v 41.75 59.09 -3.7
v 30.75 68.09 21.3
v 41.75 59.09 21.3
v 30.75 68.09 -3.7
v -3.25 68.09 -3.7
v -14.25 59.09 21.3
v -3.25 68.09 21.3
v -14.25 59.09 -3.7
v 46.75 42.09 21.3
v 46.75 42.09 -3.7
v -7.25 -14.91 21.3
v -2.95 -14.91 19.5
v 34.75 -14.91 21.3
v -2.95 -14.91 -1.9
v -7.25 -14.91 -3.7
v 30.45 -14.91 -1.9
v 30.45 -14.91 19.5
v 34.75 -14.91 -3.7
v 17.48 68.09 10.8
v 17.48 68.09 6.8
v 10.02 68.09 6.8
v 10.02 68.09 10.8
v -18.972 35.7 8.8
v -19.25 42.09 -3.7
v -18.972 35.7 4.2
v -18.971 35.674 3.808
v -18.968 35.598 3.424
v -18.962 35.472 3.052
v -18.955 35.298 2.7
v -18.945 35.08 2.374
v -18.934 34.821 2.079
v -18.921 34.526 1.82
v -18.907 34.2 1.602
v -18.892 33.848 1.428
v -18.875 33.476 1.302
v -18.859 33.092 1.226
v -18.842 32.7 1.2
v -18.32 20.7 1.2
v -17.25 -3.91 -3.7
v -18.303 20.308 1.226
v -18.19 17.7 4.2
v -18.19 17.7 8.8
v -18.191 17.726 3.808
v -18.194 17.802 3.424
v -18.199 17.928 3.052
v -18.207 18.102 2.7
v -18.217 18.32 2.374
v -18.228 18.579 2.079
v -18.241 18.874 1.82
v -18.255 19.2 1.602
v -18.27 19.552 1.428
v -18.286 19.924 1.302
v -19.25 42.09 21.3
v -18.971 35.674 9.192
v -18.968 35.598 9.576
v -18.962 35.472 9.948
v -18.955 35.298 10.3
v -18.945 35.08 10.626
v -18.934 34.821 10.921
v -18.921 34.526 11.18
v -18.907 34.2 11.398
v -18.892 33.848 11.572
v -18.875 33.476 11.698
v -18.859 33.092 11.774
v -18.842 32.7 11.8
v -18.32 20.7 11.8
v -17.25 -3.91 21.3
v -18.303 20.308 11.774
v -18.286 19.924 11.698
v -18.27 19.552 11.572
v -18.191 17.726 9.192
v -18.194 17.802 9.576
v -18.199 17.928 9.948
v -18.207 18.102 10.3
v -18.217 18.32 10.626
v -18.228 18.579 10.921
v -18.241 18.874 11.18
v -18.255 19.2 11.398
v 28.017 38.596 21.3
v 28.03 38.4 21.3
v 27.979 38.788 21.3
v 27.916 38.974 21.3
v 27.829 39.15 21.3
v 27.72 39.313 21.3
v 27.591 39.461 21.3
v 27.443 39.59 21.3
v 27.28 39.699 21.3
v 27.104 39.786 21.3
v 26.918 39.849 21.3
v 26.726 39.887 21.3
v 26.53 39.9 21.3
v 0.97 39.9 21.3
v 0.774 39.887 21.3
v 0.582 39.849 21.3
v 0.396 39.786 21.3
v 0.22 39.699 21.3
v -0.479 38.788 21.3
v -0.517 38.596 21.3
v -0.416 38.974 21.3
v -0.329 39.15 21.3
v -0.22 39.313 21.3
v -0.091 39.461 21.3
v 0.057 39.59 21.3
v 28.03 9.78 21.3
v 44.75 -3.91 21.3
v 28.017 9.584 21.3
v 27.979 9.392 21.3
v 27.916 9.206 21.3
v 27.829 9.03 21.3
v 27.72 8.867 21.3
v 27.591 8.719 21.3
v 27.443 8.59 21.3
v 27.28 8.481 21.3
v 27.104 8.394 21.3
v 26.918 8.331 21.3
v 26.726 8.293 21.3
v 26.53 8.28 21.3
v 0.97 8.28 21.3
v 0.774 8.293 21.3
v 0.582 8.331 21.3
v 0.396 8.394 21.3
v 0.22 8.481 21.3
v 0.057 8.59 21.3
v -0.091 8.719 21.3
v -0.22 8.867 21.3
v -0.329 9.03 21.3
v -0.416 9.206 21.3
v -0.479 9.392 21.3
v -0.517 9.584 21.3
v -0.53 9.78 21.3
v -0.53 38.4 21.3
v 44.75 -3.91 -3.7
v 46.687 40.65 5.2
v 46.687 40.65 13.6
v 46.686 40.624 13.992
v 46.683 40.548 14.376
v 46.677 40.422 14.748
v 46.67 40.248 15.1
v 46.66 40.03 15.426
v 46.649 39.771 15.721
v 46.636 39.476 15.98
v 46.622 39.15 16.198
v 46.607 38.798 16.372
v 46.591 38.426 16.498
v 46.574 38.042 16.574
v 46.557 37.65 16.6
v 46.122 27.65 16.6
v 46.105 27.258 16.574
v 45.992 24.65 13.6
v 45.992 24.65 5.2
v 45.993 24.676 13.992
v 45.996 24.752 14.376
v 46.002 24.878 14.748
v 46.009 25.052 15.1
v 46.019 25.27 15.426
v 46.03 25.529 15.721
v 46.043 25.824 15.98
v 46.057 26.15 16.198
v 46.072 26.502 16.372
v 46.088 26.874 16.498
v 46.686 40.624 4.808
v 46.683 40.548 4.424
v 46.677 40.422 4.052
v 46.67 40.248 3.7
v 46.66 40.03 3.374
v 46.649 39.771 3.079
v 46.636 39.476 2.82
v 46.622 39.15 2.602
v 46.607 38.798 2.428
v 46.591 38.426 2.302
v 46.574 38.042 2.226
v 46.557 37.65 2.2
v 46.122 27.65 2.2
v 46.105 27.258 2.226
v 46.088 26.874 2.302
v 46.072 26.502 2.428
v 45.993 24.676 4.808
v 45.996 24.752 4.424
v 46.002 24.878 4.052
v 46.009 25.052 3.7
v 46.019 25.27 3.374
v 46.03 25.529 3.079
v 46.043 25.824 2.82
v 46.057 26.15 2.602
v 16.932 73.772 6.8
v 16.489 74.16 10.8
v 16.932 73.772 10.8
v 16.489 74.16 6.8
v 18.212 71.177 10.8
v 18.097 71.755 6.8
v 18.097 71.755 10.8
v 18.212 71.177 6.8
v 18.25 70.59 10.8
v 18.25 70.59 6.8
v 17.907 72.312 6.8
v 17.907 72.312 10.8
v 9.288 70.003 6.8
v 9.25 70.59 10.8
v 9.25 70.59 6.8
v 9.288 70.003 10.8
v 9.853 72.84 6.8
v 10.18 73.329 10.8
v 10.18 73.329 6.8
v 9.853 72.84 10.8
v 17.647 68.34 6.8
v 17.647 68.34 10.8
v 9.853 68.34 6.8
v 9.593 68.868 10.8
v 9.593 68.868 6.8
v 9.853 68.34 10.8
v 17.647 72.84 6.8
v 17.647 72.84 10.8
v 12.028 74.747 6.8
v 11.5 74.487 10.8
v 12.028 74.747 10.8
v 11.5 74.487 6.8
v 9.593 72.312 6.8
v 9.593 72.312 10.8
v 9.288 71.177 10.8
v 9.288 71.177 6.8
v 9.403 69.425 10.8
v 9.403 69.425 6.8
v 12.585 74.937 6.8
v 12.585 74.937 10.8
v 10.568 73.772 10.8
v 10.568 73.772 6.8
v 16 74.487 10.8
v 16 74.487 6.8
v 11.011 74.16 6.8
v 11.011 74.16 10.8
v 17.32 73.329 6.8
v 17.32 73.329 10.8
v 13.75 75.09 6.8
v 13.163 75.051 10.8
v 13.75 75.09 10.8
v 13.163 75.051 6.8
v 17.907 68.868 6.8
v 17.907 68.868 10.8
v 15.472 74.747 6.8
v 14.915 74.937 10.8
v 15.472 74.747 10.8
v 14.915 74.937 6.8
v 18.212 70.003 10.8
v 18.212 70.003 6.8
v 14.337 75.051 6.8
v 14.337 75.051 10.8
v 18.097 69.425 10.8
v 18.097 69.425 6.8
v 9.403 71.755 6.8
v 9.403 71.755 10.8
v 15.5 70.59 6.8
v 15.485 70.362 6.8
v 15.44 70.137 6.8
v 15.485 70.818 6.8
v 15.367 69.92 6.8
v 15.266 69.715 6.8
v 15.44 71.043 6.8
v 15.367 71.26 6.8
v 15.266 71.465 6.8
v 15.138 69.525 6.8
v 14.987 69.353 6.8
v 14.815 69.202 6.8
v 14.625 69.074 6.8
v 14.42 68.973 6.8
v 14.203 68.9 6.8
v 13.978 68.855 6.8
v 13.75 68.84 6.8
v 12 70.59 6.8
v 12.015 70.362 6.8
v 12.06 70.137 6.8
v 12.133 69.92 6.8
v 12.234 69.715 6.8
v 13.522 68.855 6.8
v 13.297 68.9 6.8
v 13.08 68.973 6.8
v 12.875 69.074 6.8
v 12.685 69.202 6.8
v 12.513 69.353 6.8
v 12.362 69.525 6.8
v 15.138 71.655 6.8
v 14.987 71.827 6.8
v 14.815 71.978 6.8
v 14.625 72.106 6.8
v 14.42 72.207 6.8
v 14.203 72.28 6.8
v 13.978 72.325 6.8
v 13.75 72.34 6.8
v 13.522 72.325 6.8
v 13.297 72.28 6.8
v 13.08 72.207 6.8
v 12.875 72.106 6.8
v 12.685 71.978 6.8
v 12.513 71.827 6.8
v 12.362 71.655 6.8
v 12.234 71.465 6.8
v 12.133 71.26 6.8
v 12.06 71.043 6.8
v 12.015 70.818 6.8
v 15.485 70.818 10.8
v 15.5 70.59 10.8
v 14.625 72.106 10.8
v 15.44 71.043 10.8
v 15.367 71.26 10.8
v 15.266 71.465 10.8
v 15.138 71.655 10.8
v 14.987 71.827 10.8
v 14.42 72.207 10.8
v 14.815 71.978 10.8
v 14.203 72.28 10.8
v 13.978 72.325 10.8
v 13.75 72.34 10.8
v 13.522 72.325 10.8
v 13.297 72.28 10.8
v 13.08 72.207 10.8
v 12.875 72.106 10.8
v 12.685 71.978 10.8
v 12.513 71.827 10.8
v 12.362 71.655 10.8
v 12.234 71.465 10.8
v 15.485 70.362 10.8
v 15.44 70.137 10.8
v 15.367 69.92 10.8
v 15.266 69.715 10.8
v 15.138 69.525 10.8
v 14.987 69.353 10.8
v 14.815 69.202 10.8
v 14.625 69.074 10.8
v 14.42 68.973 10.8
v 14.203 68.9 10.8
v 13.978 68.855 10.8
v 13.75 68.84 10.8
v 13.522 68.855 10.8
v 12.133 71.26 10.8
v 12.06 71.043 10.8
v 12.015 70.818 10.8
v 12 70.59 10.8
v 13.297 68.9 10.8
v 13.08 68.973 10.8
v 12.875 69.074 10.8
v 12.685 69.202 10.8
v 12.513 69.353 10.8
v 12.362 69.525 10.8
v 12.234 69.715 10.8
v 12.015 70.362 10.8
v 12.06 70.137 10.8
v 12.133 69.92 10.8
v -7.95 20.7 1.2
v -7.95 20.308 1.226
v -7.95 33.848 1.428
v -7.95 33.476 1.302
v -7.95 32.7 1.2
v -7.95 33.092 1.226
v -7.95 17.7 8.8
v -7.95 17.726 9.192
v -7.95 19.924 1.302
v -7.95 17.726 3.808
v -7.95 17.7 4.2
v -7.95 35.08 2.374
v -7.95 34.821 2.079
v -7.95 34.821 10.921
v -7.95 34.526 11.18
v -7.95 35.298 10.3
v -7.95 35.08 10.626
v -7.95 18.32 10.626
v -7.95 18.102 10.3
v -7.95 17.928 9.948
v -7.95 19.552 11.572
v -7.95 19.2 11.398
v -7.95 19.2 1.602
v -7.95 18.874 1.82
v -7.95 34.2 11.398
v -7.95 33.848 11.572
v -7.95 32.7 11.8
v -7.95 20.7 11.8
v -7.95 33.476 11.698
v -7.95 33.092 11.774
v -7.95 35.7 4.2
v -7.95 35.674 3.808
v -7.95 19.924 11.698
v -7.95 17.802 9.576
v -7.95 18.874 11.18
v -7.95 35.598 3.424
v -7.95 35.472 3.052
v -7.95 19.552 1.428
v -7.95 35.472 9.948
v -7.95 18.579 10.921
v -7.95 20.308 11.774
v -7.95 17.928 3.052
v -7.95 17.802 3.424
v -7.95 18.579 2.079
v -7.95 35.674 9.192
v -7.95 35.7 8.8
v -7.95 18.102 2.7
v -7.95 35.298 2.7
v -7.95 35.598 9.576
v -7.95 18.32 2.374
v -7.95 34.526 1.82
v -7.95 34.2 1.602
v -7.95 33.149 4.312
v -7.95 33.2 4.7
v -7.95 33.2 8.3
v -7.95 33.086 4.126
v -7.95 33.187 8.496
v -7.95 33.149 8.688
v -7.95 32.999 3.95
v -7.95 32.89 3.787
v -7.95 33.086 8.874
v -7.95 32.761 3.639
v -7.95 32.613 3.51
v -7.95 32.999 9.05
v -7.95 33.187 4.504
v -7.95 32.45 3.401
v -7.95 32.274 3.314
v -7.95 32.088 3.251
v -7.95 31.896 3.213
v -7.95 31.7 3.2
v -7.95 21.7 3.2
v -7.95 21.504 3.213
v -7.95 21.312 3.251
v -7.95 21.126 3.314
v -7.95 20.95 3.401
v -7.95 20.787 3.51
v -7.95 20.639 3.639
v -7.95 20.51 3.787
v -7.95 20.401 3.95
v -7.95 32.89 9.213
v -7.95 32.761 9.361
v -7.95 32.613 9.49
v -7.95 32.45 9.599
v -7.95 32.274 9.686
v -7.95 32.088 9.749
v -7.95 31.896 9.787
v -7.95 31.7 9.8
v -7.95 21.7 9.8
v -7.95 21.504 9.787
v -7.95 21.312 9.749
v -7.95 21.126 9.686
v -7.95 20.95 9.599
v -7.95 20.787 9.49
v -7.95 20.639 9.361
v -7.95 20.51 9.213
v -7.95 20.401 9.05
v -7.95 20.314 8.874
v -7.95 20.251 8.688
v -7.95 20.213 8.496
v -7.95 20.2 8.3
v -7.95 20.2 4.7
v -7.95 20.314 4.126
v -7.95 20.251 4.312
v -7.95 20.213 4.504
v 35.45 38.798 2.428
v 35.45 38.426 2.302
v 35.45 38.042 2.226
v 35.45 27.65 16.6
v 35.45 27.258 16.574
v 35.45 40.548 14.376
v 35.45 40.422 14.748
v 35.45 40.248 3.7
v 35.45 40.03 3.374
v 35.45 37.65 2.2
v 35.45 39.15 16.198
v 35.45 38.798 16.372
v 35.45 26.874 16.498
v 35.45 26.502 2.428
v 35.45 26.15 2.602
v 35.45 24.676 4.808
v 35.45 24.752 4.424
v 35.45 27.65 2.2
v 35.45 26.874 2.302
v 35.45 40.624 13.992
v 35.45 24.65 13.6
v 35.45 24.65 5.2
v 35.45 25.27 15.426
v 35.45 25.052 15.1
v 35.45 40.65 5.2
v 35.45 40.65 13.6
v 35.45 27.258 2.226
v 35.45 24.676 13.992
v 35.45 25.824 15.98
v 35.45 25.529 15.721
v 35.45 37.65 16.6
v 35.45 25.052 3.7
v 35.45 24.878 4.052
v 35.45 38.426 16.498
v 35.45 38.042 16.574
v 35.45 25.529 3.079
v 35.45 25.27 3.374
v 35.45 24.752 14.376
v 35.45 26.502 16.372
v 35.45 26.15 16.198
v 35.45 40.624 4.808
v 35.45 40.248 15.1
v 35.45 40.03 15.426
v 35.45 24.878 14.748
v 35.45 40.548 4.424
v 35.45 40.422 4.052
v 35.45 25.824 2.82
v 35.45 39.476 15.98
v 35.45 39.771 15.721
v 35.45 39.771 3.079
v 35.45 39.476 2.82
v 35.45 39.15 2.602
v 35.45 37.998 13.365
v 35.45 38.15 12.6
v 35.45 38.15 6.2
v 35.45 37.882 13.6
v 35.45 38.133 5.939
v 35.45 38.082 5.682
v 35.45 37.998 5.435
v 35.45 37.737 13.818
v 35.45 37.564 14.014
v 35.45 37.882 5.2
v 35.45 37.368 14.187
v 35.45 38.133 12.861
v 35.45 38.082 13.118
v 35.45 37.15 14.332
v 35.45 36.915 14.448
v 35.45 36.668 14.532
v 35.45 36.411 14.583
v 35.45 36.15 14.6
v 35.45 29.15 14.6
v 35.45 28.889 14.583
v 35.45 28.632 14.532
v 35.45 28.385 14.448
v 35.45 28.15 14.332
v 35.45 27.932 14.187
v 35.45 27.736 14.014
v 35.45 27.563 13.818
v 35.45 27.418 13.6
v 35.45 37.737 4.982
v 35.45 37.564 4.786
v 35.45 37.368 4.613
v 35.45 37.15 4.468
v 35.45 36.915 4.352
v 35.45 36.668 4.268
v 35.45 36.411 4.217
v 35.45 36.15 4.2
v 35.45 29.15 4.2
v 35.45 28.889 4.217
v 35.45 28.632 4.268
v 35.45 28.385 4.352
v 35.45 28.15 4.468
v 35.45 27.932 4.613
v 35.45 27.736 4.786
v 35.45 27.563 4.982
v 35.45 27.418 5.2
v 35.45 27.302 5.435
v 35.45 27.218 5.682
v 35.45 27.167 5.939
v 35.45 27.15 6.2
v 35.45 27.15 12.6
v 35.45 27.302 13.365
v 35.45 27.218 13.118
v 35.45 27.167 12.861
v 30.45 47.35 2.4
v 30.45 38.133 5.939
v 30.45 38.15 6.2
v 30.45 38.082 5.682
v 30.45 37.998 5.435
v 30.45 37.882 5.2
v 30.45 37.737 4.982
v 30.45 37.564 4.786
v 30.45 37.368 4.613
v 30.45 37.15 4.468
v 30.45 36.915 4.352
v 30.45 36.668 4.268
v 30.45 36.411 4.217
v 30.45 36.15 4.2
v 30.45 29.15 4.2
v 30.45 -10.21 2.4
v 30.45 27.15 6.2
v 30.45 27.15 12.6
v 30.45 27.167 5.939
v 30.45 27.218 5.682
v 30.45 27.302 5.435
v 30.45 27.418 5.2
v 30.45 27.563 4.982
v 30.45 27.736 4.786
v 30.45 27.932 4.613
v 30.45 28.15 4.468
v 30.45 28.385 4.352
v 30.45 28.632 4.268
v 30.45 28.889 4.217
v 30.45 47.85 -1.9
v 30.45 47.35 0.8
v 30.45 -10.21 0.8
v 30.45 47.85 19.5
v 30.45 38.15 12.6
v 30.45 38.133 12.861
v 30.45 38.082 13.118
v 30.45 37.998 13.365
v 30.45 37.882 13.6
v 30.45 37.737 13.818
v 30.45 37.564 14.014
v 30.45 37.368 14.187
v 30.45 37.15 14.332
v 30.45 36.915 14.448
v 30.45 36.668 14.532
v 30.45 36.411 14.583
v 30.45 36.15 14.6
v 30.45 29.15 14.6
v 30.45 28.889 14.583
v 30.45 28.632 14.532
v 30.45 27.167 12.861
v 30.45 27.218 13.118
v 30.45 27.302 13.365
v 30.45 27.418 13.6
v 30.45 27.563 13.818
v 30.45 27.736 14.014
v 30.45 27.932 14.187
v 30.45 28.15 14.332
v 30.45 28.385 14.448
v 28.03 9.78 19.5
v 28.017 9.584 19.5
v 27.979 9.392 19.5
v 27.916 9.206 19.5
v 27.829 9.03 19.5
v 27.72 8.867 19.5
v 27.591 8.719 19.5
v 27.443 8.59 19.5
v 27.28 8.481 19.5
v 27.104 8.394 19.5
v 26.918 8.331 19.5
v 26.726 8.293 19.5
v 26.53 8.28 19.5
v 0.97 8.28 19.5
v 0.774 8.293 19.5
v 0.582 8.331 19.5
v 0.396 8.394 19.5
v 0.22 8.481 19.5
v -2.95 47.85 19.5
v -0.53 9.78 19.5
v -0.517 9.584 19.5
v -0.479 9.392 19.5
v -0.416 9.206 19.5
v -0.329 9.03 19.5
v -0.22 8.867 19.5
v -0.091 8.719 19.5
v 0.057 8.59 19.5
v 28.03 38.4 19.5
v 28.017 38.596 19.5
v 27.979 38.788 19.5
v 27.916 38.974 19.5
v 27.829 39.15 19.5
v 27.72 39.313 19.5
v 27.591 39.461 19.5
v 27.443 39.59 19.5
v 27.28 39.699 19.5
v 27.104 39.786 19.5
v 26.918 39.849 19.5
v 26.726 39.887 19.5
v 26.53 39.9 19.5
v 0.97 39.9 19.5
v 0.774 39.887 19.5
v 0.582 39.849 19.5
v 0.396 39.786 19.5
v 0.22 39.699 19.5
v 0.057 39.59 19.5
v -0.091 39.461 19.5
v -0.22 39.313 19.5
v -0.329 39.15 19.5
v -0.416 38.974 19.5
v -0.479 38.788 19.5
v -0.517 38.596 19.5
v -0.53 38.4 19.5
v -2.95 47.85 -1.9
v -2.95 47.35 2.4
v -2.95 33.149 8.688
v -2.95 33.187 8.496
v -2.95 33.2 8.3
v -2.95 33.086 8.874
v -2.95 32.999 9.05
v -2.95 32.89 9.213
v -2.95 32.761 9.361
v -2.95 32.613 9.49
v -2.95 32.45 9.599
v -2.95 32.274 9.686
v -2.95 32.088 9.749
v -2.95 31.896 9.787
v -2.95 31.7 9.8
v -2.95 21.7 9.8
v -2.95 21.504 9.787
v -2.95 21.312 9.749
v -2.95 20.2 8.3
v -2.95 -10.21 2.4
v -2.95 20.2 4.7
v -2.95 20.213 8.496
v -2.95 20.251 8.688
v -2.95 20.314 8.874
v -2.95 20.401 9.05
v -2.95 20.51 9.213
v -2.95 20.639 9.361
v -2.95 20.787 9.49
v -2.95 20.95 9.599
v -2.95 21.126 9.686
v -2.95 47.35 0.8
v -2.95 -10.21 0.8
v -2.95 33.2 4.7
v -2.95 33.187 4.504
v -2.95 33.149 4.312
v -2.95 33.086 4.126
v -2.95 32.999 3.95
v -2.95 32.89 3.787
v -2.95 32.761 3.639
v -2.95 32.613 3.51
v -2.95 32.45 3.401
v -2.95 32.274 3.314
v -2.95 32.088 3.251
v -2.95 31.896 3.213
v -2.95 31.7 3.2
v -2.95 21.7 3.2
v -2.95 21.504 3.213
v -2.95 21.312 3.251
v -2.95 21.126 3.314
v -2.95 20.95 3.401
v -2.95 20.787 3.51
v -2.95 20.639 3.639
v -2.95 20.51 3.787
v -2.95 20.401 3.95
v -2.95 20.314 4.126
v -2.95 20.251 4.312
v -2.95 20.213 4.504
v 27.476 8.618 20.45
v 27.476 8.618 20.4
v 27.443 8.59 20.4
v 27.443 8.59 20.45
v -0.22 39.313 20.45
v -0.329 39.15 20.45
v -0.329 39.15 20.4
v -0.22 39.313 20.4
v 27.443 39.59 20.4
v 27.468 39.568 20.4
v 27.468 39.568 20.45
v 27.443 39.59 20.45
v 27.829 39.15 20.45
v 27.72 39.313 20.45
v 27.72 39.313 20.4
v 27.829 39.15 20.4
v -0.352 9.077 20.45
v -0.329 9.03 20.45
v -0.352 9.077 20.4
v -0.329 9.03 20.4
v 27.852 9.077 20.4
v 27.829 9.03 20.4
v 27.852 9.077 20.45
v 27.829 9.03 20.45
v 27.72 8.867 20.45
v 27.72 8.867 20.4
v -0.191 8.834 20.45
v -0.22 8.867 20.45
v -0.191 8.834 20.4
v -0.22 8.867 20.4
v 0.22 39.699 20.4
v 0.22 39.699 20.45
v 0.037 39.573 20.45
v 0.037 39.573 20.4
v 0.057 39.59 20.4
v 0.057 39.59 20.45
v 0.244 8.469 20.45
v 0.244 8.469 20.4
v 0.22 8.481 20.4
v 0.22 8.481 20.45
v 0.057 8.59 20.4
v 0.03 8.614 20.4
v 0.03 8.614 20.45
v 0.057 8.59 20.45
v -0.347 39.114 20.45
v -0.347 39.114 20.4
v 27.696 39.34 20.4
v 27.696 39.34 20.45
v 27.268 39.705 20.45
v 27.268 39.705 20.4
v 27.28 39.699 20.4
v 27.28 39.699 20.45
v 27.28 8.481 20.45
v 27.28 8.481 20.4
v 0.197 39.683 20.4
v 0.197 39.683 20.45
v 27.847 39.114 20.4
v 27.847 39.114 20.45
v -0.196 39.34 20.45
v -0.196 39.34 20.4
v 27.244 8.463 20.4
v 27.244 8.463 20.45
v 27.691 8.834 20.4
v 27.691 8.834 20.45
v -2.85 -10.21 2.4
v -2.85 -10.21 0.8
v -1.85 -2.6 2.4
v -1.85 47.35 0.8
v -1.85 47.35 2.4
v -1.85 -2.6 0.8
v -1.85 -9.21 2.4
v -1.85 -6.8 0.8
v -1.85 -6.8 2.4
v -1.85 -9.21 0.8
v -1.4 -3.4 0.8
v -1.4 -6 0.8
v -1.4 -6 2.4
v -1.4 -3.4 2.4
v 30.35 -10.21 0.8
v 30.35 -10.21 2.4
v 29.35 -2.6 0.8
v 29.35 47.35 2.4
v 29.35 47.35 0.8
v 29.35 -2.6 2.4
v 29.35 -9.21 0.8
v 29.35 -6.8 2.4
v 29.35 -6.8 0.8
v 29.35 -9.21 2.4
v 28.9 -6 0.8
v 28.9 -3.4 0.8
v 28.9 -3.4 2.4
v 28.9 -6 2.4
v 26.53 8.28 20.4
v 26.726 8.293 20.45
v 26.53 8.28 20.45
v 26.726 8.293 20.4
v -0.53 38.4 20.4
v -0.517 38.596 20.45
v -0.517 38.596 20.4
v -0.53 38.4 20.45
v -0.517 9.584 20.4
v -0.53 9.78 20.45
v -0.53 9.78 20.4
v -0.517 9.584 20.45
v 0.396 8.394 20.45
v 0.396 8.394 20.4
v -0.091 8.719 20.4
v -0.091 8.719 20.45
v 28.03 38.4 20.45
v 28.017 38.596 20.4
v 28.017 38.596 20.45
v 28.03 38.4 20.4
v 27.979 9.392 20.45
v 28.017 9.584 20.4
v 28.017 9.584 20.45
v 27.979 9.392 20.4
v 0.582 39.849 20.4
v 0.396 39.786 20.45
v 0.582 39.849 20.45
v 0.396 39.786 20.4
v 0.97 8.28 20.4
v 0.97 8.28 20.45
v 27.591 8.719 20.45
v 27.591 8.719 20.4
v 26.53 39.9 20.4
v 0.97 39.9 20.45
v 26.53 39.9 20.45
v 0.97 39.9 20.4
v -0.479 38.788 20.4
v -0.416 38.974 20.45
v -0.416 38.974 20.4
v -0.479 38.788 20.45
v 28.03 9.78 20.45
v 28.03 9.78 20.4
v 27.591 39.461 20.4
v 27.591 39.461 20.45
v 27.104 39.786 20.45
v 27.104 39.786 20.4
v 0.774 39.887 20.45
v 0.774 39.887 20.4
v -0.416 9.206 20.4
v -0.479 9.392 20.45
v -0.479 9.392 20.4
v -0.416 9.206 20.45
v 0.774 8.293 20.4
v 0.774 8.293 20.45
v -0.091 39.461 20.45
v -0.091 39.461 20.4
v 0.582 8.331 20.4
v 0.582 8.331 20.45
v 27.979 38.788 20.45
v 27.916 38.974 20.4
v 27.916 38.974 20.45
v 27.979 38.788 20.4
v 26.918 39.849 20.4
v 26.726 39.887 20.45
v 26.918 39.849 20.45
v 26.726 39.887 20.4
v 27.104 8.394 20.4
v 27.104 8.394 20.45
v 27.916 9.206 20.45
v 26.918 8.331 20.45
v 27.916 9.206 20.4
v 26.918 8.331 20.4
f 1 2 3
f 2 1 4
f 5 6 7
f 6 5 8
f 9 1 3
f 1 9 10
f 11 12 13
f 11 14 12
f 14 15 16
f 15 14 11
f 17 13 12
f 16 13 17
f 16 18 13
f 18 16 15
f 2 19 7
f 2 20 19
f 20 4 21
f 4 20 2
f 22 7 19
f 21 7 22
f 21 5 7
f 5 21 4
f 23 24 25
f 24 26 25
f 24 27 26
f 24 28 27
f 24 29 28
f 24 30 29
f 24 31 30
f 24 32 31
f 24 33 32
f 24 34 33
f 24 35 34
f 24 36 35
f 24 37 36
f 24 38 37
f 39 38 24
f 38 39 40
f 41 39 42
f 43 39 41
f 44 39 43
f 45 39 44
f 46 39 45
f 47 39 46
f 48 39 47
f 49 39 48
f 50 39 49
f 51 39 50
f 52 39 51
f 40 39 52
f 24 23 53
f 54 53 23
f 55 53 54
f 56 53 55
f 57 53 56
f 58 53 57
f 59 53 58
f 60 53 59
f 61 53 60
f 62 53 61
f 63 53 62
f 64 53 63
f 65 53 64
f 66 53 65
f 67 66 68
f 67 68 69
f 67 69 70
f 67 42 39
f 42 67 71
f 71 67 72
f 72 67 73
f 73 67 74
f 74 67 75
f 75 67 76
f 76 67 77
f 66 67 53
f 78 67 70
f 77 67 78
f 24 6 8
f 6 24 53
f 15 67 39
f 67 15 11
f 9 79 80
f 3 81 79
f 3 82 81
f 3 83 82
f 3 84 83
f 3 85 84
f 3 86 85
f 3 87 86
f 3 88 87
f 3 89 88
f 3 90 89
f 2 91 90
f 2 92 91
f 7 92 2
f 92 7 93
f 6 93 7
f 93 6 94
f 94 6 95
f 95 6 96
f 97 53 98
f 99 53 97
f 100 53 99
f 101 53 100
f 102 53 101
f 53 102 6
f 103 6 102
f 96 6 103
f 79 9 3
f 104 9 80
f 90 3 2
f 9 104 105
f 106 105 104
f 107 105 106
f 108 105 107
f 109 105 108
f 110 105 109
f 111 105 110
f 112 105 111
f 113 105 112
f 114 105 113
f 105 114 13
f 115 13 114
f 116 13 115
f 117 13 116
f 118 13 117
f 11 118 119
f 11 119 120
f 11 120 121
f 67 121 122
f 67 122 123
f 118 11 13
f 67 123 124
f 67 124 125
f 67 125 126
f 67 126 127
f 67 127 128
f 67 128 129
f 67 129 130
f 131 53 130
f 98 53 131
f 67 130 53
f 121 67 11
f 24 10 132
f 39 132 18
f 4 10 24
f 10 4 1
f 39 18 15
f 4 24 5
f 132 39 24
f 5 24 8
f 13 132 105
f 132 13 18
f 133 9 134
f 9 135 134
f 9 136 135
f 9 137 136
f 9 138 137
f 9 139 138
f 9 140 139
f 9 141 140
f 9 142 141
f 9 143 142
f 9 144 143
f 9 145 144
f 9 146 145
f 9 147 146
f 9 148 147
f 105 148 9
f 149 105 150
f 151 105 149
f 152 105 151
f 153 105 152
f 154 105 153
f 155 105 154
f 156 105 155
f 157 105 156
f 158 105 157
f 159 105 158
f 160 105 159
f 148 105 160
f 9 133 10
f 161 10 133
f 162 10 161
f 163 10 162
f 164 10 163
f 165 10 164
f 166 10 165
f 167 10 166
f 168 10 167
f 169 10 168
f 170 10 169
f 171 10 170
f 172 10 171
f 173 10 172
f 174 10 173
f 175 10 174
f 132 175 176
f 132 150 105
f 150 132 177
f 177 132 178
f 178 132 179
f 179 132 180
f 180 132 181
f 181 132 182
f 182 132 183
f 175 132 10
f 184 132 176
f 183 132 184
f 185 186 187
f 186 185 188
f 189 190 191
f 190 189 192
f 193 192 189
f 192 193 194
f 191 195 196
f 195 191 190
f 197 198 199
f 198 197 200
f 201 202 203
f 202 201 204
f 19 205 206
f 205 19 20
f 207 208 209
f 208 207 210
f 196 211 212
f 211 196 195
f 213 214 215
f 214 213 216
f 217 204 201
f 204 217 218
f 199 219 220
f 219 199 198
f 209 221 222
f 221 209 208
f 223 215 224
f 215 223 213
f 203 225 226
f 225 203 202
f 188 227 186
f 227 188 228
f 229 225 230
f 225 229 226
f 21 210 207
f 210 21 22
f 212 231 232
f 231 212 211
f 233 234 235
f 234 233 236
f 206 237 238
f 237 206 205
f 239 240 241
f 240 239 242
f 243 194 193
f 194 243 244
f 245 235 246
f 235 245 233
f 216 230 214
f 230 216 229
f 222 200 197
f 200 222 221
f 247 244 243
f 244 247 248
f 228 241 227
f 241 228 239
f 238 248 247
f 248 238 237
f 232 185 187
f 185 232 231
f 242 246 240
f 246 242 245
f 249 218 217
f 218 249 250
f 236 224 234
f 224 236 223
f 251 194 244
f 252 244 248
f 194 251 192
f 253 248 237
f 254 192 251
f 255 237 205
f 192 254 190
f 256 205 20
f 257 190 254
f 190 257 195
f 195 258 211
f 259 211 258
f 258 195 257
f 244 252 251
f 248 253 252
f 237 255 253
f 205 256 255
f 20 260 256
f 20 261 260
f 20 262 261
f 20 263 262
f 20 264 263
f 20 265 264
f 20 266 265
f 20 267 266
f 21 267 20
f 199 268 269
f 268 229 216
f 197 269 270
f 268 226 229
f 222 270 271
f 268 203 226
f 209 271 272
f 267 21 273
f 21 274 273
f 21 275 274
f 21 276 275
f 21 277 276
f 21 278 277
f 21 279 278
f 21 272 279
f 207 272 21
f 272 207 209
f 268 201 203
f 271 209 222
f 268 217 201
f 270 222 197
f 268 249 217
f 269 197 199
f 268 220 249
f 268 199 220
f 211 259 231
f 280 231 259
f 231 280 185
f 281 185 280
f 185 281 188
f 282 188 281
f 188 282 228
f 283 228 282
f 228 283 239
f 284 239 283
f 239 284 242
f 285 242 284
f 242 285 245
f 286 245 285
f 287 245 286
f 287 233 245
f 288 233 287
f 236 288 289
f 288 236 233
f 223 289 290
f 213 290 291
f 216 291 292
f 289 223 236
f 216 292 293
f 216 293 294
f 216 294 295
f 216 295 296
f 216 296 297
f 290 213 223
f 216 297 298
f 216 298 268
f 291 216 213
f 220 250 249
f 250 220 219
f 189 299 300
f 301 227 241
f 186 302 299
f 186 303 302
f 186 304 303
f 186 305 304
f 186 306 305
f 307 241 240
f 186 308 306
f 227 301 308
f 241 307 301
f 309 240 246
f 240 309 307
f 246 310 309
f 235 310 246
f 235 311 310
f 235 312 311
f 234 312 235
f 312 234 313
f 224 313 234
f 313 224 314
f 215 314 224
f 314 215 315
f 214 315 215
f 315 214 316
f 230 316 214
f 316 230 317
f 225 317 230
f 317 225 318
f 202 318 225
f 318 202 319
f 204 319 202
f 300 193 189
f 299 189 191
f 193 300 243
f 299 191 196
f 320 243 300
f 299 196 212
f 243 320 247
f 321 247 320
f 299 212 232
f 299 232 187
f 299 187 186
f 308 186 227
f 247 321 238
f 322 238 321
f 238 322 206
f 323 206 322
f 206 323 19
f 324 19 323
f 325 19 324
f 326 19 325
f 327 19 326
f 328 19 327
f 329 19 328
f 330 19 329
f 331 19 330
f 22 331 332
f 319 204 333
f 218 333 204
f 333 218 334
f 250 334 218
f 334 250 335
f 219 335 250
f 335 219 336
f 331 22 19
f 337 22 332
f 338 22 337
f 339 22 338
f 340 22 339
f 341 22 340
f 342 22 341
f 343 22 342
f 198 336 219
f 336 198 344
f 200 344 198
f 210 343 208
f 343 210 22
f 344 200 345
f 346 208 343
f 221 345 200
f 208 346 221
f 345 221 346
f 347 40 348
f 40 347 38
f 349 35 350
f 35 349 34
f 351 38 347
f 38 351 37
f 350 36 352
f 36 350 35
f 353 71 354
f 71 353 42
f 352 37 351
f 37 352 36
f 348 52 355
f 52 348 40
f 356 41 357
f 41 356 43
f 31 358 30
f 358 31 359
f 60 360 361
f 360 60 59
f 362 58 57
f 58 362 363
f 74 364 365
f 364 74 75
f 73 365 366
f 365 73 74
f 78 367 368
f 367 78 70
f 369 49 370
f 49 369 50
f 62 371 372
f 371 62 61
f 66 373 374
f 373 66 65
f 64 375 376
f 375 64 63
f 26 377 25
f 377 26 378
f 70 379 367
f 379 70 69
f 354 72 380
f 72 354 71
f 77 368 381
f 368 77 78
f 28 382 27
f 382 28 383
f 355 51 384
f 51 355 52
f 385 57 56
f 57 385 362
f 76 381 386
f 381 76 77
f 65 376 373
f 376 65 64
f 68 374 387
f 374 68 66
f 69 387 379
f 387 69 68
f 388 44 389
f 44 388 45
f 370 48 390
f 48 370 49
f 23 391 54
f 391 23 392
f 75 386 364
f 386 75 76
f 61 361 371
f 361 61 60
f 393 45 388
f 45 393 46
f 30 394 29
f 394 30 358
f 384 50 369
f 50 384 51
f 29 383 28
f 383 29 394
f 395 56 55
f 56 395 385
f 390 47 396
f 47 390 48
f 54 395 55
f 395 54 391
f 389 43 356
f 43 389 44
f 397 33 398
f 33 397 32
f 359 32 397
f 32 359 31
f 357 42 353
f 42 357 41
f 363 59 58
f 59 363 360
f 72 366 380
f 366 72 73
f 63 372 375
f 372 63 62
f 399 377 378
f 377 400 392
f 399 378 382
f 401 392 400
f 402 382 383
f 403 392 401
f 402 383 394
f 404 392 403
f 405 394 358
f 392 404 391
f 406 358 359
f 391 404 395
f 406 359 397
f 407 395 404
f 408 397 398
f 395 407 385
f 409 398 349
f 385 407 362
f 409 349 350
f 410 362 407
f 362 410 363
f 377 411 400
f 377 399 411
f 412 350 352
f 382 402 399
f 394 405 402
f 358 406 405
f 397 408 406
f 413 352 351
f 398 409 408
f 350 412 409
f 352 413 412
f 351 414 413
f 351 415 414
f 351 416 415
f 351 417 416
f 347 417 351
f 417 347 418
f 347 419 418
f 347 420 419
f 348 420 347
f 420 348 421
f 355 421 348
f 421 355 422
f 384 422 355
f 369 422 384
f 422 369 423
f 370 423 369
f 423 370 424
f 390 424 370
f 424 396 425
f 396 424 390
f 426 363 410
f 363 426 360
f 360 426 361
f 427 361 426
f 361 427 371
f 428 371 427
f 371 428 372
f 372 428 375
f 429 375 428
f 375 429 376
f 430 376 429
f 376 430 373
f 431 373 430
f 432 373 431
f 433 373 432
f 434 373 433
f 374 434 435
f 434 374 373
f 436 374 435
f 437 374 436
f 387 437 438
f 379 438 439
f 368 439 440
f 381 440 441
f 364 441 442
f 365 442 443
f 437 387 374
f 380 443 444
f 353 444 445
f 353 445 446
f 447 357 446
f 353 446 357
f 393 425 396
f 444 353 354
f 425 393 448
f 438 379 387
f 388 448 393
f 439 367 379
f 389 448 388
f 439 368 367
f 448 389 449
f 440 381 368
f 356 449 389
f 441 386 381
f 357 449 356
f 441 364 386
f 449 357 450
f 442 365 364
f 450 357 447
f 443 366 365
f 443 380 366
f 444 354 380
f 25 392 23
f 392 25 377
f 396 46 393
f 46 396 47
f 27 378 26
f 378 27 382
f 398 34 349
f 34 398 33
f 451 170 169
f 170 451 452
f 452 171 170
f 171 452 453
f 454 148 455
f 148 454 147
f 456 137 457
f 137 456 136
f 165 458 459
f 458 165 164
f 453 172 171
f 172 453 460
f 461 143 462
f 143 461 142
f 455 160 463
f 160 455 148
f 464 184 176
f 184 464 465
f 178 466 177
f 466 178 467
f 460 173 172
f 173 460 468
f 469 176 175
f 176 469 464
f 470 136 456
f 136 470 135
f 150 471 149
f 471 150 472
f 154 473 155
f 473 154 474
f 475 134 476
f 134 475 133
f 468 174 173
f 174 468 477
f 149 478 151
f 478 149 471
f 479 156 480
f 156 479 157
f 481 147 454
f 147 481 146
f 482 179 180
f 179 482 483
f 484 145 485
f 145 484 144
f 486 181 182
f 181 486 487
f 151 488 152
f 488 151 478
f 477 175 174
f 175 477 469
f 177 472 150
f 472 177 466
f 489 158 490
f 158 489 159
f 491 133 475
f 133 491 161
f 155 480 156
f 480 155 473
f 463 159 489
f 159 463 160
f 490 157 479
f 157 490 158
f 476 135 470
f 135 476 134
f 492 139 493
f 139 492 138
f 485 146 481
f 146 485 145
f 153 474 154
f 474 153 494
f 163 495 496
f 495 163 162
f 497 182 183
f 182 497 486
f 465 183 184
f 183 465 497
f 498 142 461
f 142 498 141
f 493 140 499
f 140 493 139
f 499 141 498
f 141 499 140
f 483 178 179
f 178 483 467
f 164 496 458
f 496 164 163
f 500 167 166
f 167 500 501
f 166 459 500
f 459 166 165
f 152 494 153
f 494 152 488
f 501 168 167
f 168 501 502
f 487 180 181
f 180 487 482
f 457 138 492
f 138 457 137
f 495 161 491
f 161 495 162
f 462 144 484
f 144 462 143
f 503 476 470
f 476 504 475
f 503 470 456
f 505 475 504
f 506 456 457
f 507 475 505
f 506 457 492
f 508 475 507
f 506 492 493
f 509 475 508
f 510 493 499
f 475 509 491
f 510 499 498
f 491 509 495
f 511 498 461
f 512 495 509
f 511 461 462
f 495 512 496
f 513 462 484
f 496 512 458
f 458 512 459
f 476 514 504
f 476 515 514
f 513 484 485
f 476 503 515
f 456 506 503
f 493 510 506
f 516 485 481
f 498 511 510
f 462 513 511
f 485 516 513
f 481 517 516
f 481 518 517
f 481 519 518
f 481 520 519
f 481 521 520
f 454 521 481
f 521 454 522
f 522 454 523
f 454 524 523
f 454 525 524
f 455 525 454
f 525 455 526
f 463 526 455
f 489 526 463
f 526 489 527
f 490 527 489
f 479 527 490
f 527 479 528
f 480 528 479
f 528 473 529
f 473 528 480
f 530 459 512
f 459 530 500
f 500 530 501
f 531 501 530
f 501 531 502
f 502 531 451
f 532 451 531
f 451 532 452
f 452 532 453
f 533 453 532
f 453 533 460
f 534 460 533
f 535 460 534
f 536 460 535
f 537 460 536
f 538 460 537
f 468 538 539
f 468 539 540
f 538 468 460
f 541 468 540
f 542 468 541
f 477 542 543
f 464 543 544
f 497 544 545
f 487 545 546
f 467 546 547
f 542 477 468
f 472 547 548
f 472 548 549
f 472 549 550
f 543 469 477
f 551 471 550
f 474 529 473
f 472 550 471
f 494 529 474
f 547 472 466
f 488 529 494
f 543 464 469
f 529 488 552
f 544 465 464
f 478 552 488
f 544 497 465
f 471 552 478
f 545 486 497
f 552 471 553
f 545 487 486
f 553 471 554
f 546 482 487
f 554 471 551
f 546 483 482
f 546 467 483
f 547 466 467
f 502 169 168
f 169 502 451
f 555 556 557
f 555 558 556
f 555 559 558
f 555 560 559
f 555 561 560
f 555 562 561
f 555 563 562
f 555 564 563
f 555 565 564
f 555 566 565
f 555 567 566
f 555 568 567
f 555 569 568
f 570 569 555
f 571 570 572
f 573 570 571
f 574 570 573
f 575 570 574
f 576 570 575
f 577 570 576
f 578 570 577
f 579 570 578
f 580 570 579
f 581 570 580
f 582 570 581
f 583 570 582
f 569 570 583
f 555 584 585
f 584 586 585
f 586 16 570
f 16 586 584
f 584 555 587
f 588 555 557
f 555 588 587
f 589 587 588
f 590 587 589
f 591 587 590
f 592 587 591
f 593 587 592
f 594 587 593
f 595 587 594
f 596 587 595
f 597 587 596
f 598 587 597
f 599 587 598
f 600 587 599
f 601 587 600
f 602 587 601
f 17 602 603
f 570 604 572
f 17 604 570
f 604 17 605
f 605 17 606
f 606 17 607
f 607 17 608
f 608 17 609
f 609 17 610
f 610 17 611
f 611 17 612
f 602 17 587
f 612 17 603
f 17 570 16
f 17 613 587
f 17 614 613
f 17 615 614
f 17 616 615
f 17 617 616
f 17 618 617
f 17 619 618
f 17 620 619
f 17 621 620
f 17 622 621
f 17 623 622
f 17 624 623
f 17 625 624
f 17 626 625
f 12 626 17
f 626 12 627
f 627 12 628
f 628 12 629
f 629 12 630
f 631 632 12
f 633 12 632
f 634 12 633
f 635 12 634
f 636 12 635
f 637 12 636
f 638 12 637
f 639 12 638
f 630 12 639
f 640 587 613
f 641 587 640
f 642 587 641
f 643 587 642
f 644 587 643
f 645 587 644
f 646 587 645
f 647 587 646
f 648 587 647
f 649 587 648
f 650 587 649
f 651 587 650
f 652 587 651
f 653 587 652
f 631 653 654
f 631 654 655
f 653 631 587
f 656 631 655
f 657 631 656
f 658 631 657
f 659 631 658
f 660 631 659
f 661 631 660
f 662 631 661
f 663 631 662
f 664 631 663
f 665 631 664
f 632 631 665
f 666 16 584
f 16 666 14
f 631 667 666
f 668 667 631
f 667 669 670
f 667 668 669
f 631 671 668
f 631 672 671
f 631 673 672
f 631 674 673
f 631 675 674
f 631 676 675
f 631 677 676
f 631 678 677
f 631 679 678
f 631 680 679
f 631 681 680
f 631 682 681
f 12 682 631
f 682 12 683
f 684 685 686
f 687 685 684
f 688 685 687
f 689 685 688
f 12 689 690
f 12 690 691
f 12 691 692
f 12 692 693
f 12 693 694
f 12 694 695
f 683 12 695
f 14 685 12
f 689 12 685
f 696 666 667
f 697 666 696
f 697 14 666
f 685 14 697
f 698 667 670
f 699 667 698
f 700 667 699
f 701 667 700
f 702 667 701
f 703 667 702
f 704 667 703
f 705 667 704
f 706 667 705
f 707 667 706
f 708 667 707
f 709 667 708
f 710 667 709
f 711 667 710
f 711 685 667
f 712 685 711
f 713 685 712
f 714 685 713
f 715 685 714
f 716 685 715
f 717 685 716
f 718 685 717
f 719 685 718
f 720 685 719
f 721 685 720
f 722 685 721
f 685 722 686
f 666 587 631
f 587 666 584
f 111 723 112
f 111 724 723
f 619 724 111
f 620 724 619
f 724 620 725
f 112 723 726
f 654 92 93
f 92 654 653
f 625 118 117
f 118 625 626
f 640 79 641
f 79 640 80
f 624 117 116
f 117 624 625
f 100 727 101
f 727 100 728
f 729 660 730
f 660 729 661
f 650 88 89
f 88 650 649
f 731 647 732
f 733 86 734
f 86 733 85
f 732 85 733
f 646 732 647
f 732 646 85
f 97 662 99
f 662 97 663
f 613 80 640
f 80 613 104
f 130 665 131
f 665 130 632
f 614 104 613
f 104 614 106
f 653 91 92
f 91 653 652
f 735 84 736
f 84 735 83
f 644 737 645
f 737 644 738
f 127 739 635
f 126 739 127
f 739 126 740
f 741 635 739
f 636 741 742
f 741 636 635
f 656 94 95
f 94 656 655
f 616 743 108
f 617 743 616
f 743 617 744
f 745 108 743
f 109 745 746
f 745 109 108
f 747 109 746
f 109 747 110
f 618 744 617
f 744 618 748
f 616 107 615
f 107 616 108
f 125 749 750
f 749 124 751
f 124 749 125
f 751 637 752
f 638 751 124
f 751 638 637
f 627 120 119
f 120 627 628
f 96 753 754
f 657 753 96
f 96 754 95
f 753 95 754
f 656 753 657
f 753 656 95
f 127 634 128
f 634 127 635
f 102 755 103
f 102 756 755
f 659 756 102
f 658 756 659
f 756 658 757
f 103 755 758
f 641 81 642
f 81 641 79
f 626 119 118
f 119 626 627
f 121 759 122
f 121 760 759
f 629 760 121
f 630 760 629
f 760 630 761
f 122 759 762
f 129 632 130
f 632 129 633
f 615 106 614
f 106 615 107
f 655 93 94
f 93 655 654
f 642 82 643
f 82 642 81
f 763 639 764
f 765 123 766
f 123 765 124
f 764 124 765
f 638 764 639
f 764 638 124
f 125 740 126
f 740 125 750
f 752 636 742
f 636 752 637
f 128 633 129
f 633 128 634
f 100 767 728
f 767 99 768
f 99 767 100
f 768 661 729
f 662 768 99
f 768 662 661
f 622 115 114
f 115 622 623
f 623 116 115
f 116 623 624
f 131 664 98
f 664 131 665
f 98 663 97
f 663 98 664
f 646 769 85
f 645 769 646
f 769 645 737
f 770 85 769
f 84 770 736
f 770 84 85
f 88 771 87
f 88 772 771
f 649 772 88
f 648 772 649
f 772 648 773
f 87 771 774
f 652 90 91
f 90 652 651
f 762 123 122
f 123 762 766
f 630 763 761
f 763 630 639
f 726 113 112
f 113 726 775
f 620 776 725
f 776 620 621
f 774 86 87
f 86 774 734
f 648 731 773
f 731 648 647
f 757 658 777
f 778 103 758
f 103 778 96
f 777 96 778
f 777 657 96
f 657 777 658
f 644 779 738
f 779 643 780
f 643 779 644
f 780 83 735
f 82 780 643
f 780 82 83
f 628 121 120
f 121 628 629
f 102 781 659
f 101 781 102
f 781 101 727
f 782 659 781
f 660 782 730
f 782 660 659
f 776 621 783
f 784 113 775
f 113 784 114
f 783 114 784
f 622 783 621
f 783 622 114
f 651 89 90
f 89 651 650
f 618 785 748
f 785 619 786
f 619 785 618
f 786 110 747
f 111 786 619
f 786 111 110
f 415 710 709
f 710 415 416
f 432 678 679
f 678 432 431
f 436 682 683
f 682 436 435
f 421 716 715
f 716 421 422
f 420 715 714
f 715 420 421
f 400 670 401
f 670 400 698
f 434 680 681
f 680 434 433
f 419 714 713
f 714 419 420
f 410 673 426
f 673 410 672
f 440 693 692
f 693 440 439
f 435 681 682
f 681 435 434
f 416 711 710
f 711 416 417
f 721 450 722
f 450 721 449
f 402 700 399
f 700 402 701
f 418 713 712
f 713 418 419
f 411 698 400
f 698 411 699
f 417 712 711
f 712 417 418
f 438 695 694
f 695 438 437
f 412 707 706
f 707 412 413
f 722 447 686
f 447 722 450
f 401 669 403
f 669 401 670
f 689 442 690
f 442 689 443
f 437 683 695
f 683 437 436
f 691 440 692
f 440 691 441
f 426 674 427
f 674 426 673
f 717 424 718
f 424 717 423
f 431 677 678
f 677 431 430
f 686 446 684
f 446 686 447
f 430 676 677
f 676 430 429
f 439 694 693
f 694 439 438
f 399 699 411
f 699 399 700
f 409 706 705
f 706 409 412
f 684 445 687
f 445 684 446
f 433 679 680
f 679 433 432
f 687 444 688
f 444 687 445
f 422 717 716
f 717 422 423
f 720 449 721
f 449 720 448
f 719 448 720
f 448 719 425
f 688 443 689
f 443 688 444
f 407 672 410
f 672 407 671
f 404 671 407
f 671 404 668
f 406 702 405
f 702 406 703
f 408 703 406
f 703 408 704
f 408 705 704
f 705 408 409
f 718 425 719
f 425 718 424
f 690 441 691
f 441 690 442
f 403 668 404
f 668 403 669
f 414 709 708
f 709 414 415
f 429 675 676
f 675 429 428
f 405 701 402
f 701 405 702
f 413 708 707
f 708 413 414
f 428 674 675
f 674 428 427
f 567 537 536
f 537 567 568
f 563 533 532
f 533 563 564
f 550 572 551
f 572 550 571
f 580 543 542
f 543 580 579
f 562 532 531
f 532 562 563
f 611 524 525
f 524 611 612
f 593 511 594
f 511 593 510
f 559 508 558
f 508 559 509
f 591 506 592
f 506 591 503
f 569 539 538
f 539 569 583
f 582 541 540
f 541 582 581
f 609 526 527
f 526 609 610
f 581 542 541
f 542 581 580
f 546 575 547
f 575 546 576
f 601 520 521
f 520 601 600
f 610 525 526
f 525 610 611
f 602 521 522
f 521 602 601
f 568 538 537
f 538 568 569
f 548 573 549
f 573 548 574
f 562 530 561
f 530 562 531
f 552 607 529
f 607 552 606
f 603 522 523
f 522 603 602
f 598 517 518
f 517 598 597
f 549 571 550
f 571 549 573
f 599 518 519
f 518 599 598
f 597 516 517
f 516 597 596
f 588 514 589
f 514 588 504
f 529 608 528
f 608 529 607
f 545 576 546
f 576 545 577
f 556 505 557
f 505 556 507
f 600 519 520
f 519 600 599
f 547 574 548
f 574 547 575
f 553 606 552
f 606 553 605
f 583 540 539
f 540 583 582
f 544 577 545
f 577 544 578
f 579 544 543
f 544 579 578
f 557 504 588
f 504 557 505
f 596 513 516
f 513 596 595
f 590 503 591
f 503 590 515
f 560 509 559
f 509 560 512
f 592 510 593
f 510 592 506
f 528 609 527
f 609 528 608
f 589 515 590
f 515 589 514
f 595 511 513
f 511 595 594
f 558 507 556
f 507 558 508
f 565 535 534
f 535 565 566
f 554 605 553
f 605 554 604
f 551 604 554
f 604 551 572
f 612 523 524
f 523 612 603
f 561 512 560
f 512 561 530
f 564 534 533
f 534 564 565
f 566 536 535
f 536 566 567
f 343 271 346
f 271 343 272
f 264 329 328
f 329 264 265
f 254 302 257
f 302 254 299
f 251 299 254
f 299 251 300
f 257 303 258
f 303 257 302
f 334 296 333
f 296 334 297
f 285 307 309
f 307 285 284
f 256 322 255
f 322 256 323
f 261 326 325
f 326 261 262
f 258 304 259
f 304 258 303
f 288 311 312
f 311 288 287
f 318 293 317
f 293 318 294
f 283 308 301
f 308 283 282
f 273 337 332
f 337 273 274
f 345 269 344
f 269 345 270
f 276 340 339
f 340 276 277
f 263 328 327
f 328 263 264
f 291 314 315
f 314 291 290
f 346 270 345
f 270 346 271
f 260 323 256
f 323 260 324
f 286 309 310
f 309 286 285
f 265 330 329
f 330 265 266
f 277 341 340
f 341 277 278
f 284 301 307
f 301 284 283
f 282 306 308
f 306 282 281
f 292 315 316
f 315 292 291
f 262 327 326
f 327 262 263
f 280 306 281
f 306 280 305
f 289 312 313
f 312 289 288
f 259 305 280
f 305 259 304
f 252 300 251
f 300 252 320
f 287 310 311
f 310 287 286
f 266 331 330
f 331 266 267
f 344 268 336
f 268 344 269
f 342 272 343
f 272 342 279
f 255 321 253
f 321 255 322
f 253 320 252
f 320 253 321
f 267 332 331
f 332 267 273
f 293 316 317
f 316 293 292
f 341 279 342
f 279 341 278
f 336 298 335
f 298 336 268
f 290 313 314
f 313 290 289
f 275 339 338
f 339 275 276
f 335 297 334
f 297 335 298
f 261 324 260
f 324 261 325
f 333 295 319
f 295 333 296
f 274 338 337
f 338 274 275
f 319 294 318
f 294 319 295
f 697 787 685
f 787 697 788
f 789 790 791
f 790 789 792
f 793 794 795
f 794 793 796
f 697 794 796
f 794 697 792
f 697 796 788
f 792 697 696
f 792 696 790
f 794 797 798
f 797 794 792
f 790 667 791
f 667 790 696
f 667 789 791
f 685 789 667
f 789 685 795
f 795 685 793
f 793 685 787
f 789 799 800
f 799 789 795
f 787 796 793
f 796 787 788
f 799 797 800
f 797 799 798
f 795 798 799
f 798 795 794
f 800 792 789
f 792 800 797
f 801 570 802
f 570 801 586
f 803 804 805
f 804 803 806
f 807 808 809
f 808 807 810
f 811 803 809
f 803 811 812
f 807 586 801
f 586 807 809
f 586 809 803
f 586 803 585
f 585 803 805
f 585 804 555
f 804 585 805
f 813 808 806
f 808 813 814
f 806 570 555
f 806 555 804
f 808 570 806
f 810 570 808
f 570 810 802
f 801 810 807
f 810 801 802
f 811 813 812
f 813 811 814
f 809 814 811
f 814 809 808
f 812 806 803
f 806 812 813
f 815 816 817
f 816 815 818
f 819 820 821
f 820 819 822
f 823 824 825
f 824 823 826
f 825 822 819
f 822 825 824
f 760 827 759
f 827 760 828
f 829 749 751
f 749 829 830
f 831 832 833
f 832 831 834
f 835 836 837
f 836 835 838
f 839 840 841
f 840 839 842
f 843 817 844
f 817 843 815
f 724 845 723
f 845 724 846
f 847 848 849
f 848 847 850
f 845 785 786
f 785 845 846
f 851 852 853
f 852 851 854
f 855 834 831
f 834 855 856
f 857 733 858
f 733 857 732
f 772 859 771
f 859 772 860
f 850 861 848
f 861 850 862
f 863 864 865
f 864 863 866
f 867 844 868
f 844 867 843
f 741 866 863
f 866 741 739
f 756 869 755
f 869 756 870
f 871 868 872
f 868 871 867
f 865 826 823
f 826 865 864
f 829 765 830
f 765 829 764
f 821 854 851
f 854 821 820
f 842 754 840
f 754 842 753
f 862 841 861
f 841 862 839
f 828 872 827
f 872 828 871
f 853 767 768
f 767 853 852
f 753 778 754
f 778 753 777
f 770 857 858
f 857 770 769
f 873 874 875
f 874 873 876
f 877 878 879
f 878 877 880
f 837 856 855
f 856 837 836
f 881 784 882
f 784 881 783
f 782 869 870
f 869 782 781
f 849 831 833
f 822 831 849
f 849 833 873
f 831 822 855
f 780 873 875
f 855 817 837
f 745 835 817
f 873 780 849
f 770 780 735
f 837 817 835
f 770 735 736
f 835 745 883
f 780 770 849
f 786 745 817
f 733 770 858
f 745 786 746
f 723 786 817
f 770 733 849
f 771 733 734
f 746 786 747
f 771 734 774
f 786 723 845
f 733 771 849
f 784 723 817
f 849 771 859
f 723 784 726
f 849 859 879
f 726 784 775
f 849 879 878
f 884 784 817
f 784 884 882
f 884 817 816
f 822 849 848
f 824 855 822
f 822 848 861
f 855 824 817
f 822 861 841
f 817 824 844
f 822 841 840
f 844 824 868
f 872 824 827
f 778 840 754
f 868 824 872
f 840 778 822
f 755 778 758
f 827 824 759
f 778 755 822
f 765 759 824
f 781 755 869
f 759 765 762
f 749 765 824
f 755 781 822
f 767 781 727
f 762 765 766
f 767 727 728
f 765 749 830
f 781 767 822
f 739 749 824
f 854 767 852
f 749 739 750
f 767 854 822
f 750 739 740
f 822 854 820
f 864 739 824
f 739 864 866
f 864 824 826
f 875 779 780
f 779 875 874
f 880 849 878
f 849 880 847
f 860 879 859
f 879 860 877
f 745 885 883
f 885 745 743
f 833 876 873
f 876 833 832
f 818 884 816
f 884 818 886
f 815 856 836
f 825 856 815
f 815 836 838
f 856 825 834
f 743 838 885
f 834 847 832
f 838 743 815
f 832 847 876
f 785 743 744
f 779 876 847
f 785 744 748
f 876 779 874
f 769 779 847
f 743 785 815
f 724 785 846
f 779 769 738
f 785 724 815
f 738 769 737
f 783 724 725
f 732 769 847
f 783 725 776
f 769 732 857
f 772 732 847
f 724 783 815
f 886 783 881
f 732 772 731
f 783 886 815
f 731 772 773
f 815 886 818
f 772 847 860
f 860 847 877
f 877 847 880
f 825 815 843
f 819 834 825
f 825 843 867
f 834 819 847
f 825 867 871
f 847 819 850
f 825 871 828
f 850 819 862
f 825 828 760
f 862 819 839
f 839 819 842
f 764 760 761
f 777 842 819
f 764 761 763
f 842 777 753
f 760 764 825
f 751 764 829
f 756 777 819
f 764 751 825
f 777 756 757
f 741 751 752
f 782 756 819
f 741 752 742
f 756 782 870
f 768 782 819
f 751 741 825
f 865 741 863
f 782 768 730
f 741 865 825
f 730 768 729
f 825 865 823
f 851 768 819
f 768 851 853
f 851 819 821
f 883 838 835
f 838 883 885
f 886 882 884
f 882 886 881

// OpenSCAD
// Fresh branch from V2. No dependency on the archived v3-v10 attempts.
// Retains V2's complete Iron Man sleeve geometry; replaces only the front colour layout.
// part: ironman_v2b | body/gold/black/white[_print] | check_core/colours/backing/baseline
include <xmas_orn_outers_v2.scad>
part = "ironman_v2b";
preview_display = true;
fresh_names = ["body", "gold", "black", "white"];
fresh_colours = ["#a91f2c", "#e4b44f", "#24232b", "#e5f8ff"];

module fresh_reactor() polygon([[-24,23],[24,23],[17,-16],[-17,-16]]);
module fresh_gold() v2_bilateral() {
    // Small angular shoulder plates and narrow armour at the sides of the display.
    polygon([[13,42],[17,43],[24,37],[27,29],[22,30],[18,37]]);
    polygon([[28,19],[30,17],[29,-16],[22,-28],[20,-27],[25,-15]]);
}
module fresh_black() offset(delta=1.2) fresh_reactor();
module fresh_white() difference() { fresh_reactor(); offset(delta=-1.5) fresh_reactor(); }
module fresh_raw(c) {
    if (c == 1) fresh_gold();
    if (c == 2) fresh_black();
    if (c == 3) fresh_white();
}
module fresh_ink(c) difference() {
    intersection() { v2_outline(2); fresh_raw(c); }
    if (c < 3) for (k = [c+1:3]) fresh_raw(k);
}
module fresh_body() difference() {
    // Reunite the V2 body and its inlays, then cut the new inlay pockets.
    // This keeps its outline, loop, rails, pocket, detents and openings exactly.
    v2_solid(2);
    translate([v2_cx,v2_cy,sz1-inlay_d]) linear_extrude(inlay_d+eps)
        for (c = [1:3]) fresh_raw(c);
}
module fresh_colour(c) difference() {
    translate([v2_cx,v2_cy,sz1-inlay_d]) linear_extrude(inlay_d) fresh_ink(c);
    sleeve_cuts(ext=40, finger=true);
}
module fresh_piece(c) { if (c == 0) fresh_body(); else fresh_colour(c); }
module fresh_solid() union() for (c = [0:3]) fresh_piece(c);

if (part == "ironman_v2b") {
    for (c = [0:3]) color(fresh_colours[c]) render() fresh_piece(c);
    if (preview_display) color("#101a25") translate([v2_cx,v2_cy,sz1-inlay_d-0.1])
        linear_extrude(0.05) v2_window();
}
for (c = [0:3]) {
    if (part == fresh_names[c]) fresh_piece(c);
    if (part == str(fresh_names[c],"_print")) v2_stand(2) fresh_piece(c);
}
if (part == "check_core") intersection() { fresh_solid(); union() { core_tray(); core_bezel(); } }
if (part == "check_colours") for (a = [0:2], b = [a+1:3])
    intersection() { fresh_piece(a); fresh_piece(b); }
if (part == "check_backing") difference() {
    translate([0,0,-inlay_d]) union() for (c = [1:3]) fresh_colour(c);
    fresh_body();
}
if (part == "check_baseline") {
    difference() { fresh_solid(); v2_solid(2); }
    difference() { v2_solid(2); fresh_solid(); }
}
